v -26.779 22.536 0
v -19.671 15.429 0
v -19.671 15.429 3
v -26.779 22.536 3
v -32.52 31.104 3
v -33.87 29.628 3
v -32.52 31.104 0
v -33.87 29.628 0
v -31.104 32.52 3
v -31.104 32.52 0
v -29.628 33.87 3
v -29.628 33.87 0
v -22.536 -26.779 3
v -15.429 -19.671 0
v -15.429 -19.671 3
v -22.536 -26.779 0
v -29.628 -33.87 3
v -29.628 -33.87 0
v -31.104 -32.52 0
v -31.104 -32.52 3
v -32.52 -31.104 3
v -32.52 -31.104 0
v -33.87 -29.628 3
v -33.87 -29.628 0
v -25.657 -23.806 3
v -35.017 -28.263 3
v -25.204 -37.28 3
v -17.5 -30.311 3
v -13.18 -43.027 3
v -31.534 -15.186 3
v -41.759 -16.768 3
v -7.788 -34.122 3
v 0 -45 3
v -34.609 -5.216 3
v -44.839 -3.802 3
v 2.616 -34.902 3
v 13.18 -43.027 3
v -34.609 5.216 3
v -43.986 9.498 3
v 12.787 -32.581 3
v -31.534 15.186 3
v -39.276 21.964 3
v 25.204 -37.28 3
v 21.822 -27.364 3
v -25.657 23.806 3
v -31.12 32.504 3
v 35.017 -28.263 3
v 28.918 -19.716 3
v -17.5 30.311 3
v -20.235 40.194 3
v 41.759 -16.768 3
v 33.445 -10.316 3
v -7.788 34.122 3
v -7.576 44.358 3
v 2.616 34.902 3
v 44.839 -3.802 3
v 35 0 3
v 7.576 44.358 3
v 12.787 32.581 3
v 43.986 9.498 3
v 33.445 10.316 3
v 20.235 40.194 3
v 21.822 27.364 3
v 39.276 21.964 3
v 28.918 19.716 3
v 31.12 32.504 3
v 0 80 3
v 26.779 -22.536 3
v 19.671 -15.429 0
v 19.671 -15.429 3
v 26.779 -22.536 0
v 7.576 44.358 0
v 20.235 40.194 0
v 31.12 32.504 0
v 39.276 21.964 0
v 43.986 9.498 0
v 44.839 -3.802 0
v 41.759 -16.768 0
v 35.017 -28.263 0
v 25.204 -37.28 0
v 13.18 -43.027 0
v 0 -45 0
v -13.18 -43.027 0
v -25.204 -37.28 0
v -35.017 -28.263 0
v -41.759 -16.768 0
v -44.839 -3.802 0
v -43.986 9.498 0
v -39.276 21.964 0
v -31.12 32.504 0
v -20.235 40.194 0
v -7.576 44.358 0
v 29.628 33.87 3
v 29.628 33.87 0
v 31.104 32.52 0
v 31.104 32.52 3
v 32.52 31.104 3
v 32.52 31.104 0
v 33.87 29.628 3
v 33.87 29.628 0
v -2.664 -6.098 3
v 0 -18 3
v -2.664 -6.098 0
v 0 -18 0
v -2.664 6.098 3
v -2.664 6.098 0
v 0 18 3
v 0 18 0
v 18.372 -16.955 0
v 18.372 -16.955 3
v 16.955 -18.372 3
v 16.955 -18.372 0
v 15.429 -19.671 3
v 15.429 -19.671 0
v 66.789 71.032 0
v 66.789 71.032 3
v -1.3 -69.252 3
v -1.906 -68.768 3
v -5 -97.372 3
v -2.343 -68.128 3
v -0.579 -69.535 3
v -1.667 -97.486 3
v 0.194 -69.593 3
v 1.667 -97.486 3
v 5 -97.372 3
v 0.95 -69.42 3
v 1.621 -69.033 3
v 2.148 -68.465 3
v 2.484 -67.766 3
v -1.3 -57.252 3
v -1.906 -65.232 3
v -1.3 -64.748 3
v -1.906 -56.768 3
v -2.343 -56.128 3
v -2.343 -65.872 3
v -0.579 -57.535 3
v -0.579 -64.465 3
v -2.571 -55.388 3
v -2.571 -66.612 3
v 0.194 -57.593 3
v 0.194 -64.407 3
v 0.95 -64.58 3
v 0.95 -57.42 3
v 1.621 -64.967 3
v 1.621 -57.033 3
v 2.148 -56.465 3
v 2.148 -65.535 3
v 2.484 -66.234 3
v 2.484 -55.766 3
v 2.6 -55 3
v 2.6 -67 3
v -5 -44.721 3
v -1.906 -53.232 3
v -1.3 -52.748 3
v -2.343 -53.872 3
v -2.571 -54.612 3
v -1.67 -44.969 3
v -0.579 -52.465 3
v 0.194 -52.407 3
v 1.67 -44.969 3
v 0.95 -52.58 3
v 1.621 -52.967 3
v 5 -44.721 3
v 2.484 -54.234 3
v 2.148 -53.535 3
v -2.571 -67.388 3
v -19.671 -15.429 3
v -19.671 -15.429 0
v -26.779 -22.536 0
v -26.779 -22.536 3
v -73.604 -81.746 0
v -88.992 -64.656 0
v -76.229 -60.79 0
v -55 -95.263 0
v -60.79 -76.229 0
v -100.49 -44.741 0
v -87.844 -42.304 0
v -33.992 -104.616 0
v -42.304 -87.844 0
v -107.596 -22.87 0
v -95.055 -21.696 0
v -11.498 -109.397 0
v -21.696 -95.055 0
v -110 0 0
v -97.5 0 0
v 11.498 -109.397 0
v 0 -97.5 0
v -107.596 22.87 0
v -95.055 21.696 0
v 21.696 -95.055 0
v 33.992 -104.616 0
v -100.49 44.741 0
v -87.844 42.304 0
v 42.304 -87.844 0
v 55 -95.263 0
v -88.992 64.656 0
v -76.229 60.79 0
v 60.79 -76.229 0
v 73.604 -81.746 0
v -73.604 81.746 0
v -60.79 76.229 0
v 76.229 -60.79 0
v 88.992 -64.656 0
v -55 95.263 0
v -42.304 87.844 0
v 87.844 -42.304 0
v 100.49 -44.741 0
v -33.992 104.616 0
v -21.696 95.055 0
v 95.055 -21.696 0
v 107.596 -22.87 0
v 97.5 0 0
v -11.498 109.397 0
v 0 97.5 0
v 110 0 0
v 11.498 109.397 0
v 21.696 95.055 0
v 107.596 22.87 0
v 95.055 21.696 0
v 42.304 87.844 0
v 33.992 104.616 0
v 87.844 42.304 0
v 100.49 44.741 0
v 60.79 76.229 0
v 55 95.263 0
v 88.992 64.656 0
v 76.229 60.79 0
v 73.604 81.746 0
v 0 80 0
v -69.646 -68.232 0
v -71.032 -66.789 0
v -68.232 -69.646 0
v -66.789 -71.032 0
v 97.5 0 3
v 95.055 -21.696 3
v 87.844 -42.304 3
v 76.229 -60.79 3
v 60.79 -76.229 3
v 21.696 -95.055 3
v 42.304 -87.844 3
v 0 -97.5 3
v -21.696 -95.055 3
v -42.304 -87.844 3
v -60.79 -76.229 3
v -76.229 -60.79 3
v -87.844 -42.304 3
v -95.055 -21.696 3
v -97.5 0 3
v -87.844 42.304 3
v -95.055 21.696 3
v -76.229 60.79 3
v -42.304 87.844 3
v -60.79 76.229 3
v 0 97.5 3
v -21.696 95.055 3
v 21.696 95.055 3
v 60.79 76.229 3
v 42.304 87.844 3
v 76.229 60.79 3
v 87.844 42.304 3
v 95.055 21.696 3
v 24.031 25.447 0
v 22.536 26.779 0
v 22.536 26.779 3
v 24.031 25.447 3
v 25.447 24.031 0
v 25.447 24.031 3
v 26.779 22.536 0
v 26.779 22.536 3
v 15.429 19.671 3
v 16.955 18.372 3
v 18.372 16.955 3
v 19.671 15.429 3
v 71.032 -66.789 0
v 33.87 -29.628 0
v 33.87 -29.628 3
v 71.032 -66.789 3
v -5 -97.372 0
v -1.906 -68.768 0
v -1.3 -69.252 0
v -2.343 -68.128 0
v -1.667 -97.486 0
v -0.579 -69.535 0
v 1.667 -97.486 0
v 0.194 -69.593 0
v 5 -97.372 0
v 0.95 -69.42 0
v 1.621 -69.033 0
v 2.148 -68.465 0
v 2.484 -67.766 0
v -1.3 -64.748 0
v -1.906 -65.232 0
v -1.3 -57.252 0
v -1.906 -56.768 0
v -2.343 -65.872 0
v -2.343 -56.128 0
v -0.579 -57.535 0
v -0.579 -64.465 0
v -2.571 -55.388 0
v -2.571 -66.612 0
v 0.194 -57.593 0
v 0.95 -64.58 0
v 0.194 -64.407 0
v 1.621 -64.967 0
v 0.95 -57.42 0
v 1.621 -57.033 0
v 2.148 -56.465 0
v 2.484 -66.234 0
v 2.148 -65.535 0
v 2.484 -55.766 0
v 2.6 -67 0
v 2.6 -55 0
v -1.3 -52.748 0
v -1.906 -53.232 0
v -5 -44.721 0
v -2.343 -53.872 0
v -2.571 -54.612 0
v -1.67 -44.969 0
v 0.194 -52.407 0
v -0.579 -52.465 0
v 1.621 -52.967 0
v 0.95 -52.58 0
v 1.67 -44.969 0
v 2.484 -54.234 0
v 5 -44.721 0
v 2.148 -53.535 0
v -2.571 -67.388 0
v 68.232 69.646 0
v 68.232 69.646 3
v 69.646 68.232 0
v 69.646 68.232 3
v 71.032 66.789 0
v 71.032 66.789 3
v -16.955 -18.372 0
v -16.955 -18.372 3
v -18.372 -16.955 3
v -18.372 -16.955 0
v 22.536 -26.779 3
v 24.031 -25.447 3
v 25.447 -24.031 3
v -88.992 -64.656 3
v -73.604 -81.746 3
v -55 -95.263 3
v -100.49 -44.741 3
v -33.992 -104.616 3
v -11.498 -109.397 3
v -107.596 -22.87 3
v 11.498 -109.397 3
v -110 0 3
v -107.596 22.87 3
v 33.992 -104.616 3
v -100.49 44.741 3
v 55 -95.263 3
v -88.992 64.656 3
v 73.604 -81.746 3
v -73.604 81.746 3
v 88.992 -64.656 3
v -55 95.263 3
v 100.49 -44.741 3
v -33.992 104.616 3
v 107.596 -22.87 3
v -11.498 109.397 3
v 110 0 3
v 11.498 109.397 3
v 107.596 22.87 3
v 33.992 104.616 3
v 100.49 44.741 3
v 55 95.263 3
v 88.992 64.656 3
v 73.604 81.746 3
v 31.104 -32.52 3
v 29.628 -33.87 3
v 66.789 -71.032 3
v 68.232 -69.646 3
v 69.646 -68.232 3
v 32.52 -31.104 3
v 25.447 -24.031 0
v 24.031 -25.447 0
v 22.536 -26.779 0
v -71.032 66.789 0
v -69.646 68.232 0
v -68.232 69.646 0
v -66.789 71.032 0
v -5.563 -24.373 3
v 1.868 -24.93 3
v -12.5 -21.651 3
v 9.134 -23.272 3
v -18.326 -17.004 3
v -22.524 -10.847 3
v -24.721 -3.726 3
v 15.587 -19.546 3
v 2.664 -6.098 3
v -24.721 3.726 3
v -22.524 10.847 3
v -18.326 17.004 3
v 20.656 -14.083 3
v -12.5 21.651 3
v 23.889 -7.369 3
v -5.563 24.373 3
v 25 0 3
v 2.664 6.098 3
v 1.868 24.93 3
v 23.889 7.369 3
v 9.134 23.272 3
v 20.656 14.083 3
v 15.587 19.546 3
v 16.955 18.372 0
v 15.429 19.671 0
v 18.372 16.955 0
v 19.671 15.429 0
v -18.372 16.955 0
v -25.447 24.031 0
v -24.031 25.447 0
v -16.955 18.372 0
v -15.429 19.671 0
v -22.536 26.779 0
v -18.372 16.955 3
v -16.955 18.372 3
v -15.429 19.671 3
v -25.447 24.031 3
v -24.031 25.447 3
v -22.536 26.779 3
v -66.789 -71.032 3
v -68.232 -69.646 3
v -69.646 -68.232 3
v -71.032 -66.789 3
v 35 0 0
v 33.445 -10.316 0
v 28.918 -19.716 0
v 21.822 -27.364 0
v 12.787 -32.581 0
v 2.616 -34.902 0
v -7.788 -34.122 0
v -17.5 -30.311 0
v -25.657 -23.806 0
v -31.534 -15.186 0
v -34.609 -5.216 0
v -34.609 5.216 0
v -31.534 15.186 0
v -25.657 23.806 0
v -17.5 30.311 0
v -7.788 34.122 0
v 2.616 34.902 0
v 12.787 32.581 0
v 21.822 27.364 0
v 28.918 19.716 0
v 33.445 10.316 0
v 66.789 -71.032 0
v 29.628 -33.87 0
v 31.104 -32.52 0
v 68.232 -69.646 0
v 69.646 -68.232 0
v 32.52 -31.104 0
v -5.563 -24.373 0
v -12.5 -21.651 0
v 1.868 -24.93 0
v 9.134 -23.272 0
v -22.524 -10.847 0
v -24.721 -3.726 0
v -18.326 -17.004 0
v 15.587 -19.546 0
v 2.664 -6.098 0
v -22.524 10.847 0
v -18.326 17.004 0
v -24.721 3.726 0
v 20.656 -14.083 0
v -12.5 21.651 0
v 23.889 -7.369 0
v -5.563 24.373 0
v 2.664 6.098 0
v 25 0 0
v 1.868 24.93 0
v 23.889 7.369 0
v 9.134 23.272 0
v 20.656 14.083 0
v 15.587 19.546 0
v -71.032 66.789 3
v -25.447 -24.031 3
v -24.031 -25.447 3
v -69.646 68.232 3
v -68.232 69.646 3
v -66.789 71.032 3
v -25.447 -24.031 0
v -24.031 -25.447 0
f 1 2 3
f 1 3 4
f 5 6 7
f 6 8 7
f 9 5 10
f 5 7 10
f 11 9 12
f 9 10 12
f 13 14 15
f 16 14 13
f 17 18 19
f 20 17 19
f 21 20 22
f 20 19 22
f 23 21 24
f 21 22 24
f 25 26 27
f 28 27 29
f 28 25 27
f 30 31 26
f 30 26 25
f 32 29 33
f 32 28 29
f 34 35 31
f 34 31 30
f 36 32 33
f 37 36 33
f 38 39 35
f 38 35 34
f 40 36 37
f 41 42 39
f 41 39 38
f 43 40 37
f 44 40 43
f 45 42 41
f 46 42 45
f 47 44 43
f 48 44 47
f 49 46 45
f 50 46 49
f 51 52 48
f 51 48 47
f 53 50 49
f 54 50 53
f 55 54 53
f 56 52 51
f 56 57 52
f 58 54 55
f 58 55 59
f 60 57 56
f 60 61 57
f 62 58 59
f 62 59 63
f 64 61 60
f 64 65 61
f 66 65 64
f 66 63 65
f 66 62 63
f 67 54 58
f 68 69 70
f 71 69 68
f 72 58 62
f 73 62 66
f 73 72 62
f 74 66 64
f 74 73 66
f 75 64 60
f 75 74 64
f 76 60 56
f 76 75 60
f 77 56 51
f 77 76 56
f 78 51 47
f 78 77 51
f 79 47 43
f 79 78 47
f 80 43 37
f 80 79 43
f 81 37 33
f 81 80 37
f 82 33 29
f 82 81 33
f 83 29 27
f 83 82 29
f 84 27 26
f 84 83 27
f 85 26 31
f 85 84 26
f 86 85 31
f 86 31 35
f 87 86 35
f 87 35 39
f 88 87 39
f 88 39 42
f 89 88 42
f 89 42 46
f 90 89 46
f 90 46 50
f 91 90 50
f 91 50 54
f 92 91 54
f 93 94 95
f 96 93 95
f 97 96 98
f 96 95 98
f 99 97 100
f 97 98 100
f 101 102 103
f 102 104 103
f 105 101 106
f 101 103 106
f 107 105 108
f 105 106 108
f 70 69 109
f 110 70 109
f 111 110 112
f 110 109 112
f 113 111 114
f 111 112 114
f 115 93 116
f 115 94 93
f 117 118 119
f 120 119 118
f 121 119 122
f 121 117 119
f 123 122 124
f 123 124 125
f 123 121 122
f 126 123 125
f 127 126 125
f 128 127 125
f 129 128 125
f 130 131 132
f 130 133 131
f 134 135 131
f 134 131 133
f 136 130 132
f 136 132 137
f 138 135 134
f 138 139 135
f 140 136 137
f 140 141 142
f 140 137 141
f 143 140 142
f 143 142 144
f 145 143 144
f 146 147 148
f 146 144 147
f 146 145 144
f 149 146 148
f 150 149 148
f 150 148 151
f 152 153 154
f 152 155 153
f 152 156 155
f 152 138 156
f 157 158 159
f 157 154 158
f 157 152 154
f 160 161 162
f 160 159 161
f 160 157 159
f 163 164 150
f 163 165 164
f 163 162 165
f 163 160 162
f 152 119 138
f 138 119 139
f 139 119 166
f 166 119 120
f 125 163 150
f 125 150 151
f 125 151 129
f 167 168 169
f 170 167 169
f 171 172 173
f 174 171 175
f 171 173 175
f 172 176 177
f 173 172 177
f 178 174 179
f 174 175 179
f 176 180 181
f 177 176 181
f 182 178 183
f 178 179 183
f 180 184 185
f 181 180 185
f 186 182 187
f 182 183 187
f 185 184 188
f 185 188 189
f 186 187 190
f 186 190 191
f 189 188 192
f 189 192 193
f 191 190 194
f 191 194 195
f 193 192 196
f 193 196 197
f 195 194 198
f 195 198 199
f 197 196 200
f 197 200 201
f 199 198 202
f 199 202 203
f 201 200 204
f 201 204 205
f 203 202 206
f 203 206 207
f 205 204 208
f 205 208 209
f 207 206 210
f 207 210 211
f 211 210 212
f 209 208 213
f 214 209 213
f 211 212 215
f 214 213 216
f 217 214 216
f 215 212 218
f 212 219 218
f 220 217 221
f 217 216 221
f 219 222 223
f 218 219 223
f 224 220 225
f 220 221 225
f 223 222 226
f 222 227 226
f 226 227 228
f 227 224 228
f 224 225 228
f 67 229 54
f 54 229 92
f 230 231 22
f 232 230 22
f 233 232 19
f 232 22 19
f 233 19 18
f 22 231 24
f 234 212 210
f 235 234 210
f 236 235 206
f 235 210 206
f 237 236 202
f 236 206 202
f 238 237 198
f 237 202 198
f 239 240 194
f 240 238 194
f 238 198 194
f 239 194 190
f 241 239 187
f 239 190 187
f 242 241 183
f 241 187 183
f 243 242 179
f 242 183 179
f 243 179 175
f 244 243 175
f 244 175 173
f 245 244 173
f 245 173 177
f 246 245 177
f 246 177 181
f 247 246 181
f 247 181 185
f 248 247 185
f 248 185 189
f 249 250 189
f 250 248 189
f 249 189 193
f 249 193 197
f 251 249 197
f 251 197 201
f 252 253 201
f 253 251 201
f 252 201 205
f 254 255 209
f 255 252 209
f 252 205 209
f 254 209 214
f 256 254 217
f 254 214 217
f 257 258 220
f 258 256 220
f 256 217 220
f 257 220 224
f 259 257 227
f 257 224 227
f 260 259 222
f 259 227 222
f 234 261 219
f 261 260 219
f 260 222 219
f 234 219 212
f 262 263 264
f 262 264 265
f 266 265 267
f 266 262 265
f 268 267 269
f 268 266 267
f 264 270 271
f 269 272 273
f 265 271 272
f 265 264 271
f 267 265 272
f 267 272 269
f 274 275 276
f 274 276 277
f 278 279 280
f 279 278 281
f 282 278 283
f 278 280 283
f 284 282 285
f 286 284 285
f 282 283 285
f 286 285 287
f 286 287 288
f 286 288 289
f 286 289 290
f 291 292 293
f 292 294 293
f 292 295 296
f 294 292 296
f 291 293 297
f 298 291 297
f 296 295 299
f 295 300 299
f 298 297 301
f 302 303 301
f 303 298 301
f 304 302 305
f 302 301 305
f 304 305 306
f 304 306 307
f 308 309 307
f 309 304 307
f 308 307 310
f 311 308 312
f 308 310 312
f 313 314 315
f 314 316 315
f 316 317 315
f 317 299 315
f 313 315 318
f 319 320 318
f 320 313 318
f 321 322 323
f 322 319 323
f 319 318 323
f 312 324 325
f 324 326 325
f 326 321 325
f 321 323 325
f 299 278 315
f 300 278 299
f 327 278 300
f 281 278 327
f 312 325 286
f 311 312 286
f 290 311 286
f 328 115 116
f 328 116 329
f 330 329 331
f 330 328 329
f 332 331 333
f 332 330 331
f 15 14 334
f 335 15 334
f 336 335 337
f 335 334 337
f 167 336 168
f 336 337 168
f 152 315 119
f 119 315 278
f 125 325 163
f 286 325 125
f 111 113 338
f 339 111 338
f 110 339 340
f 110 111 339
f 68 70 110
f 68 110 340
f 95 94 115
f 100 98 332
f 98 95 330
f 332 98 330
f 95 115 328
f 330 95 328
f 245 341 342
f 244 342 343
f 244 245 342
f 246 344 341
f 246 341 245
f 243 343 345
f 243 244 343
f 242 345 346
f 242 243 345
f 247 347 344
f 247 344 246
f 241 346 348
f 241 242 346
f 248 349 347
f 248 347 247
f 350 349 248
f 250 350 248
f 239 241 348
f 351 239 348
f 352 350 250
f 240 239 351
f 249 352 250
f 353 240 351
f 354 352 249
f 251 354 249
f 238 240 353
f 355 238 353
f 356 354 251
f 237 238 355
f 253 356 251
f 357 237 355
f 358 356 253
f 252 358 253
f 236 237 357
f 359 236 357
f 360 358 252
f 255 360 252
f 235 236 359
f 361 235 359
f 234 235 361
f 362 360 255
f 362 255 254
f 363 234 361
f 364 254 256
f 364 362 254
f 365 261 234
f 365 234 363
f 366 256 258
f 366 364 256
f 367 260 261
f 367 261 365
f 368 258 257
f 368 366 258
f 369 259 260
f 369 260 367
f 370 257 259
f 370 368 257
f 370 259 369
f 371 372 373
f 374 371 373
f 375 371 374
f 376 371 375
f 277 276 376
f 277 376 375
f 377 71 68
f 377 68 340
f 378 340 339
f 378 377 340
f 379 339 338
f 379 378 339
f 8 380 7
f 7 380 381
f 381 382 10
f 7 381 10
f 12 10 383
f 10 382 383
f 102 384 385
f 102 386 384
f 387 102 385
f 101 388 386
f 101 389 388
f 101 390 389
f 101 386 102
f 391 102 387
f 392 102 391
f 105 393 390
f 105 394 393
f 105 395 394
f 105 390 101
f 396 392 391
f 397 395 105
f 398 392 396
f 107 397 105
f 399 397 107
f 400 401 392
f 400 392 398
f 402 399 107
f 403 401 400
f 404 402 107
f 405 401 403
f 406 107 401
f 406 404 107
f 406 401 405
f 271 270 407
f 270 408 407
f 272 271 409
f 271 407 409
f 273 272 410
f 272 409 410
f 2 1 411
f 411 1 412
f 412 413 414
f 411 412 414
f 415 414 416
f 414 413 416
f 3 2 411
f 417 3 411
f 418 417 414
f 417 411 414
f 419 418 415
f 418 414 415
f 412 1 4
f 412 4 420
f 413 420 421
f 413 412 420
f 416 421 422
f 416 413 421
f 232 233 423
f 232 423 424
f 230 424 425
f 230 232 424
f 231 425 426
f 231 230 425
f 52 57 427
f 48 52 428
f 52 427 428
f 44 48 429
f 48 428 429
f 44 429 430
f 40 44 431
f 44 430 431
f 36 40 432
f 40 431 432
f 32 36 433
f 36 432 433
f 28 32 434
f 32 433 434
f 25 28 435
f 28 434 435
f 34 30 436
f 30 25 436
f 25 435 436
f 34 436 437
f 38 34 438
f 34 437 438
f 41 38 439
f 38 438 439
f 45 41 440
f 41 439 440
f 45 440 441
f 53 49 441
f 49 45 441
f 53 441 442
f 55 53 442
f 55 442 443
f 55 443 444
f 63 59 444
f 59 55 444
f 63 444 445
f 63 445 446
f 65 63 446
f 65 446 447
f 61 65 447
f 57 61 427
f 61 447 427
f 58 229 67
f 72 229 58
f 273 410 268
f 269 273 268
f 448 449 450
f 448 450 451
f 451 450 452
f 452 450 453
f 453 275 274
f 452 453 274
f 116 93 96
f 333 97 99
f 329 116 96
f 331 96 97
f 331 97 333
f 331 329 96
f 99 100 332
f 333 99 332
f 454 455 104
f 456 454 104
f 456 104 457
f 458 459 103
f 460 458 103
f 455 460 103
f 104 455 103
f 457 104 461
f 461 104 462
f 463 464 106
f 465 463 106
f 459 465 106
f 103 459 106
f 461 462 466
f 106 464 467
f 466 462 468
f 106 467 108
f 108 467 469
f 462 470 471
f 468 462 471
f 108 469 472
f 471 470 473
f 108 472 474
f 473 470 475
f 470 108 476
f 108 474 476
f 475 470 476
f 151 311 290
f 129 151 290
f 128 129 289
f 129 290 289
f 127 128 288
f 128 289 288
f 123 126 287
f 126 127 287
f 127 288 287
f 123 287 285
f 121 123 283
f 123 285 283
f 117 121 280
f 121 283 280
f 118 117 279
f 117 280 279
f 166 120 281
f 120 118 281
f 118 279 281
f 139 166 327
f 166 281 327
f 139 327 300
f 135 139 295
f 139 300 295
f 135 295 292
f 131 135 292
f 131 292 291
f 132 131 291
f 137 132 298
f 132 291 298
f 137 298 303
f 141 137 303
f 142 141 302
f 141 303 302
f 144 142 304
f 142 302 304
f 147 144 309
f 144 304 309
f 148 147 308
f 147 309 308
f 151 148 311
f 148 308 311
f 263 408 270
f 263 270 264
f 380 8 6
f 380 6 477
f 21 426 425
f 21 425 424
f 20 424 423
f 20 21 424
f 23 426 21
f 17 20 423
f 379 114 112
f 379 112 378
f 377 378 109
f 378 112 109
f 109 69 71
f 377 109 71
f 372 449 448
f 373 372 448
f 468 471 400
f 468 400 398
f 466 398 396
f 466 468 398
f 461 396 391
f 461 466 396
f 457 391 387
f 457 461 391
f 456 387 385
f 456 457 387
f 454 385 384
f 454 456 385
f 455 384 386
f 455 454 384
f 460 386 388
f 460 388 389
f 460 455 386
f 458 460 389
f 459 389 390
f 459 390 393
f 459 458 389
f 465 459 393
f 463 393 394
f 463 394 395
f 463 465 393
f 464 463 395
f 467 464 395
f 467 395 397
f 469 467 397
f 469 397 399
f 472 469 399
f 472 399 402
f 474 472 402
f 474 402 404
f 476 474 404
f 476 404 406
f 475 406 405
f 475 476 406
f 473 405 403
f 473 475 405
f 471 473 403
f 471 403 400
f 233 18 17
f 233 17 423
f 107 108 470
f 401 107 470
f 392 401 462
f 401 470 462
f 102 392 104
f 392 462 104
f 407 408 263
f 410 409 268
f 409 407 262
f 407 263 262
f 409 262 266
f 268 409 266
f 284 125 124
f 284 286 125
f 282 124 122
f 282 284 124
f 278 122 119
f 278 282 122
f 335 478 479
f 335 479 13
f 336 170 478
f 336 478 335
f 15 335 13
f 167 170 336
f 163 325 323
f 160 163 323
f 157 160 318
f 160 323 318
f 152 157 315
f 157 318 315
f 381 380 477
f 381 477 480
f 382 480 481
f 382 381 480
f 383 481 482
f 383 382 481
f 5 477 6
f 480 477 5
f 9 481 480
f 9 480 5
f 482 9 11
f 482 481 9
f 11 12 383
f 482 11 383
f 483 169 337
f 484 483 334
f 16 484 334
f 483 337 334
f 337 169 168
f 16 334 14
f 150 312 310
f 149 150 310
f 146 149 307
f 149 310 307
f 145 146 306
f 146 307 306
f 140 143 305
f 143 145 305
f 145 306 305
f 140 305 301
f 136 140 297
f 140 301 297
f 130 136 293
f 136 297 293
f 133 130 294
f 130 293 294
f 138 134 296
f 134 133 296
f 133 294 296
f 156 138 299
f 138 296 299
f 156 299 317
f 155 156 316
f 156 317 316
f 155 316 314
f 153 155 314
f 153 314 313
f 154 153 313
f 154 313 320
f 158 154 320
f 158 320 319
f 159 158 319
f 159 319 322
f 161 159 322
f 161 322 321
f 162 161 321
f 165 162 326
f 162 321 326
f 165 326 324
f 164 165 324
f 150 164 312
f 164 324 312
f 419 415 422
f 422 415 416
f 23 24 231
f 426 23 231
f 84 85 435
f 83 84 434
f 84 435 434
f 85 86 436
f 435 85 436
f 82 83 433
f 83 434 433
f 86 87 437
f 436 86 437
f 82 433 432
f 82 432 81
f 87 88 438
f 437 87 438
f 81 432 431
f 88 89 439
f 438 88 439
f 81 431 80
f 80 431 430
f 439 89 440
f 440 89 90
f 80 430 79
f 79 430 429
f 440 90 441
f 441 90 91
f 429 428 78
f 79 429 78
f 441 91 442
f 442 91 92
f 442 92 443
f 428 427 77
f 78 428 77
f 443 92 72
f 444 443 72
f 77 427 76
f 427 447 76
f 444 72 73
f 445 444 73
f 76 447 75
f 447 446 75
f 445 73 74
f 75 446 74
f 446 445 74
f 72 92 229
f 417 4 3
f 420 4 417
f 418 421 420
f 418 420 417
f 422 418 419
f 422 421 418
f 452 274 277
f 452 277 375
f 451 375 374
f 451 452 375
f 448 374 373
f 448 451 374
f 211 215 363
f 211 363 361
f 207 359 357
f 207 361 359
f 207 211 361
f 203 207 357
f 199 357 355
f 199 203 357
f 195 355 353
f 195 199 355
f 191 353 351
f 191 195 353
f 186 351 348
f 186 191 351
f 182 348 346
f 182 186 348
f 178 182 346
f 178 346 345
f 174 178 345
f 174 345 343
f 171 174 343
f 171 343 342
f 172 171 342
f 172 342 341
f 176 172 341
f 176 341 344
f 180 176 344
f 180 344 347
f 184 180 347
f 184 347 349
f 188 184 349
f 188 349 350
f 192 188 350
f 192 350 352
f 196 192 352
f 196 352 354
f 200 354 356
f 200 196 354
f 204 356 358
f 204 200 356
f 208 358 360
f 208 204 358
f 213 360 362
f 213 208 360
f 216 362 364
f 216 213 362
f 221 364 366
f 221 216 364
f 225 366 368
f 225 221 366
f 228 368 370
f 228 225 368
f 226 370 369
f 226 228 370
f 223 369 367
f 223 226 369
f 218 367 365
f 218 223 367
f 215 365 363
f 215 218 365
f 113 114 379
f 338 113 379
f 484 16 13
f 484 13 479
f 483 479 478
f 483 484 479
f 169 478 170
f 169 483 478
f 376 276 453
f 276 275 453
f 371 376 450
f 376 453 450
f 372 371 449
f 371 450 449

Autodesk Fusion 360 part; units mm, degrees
sketch "スケッチ1" plane through (0, 0, 0) normal (0, 0, 1) x (1, 0, 0)
  circle A0 centre (0, 0) radius 110
  circle A1 centre (0, 0) radius 97.5
  circle A2 centre (0, 0) radius 25
  circle A3 centre (0, 0) radius 35
  line L0 (0, 80) -> (-7.576, 44.3577)
  line L1 (0, 0) -> (0, 110) construction
  line L2 (0, 80) -> (7.576, 44.3577)
  arc A4 (-7.576, 44.3577) -> (7.576, 44.3577) centre (0, 0) ccw
  line L3 (0, 0) -> (0, -18) construction
  line L4 (0, 0) -> (-3, 0) construction
  arc A5 (0, 18) -> (0, -18) centre (52.5, 0) ccw
  arc A6 (0, -18) -> (0, 18) centre (-52.5, 0) ccw
  line L5 (0, 0) -> (68.9429, 68.9429) construction
  line L6 (0, 0) -> (97.5, 0) construction
  line L7 (33.8703, 29.6277) -> (71.0316, 66.7889)
  line L8 (29.6277, 33.8703) -> (66.7889, 71.0316)
  line L9 (19.6712, 15.4286) -> (26.779, 22.5363)
  line L10 (15.4286, 19.6712) -> (22.5363, 26.779)
  line L11 (-33.8703, 29.6277) -> (-71.0316, 66.7889)
  line L12 (-29.6277, 33.8703) -> (-66.7889, 71.0316)
  line L13 (-19.6712, 15.4286) -> (-26.779, 22.5363)
  line L14 (-15.4286, 19.6712) -> (-22.5363, 26.779)
  line L15 (-29.6277, -33.8703) -> (-66.7889, -71.0316)
  line L16 (-33.8703, -29.6277) -> (-71.0316, -66.7889)
  line L17 (-15.4286, -19.6712) -> (-22.5363, -26.779)
  line L18 (-19.6712, -15.4286) -> (-26.779, -22.5363)
  line L19 (33.8703, -29.6277) -> (71.0316, -66.7889)
  line L20 (29.6277, -33.8703) -> (66.7889, -71.0316)
  line L21 (19.6712, -15.4286) -> (26.779, -22.5363)
  line L22 (15.4286, -19.6712) -> (22.5363, -26.779)
  line L23 (-5, -44.7214) -> (-5, -97.3717)
  line L24 (5, -44.7214) -> (5, -97.3717)
  circle A7 centre (0, -55) radius 2.6
  circle A8 centre (0, -67) radius 2.6
  point P0 (0, 18)
  point P1 (0, -18)
  dimension "d1" = 220
  dimension "d2" = 195
  dimension "d3" = 50
  dimension "d4" = 70
  dimension "d5" = 90
  dimension "d6" = 80
  dimension "d7" = 12
  dimension "d8" = 18
  dimension "d9" = 18
  dimension "d10" = 3
  dimension "d11" = 45
  dimension "d12" = 3
  dimension "d13" = 3
  dimension "d15" = 360
  dimension "d20" = 10
  dimension "d21" = 5.2
  dimension "d22" = 5.2
  dimension "d23" = 55
  dimension "d24" = 12
  dimension "d25" = 5
  dimension "d26" = 5
extrude "押し出し1" add sketch "スケッチ1" along normal blind 3 contours A0 | L0 L2 A4 | A2 makes body 1 at (-61.458, 85.8309, 0) makes body 2 at (0, 56.2385, 3) makes body 3 at (10.2526, 0, 0)
extrude "押し出し2" add sketch "スケッチ1" along normal blind 3 separate body contours A1 A4 L7 L8 | A1 A4 L19 L20 | A1 A4 L11 L12 | A1 A4 L23 L24 | A1 A4 L15 L16 | A2 A3 L9 L10 | A2 A3 L21 L22 | A2 A3 L13 L14 | A2 A3 L17 L18 makes body 4 at (-18.3066, -21.6074, 0) makes body 5 at (44.4235, 43.952, 0) makes body 6 at (-43.952, 44.4235, 0) makes body 7 at (21.6074, -18.3066, 0) makes body 8 at (-21.6074, 18.3066, 0) makes body 9 at (43.952, -44.4235, 0) makes body 10 at (-44.4235, -43.952, 0) makes body 11 at (18.3066, 21.6074, 0) makes body 12 at (-0.0648, -88.1881, 0)
equation "d8 = d9"
equation "d13 = d12"
equation "d26 = d25"
